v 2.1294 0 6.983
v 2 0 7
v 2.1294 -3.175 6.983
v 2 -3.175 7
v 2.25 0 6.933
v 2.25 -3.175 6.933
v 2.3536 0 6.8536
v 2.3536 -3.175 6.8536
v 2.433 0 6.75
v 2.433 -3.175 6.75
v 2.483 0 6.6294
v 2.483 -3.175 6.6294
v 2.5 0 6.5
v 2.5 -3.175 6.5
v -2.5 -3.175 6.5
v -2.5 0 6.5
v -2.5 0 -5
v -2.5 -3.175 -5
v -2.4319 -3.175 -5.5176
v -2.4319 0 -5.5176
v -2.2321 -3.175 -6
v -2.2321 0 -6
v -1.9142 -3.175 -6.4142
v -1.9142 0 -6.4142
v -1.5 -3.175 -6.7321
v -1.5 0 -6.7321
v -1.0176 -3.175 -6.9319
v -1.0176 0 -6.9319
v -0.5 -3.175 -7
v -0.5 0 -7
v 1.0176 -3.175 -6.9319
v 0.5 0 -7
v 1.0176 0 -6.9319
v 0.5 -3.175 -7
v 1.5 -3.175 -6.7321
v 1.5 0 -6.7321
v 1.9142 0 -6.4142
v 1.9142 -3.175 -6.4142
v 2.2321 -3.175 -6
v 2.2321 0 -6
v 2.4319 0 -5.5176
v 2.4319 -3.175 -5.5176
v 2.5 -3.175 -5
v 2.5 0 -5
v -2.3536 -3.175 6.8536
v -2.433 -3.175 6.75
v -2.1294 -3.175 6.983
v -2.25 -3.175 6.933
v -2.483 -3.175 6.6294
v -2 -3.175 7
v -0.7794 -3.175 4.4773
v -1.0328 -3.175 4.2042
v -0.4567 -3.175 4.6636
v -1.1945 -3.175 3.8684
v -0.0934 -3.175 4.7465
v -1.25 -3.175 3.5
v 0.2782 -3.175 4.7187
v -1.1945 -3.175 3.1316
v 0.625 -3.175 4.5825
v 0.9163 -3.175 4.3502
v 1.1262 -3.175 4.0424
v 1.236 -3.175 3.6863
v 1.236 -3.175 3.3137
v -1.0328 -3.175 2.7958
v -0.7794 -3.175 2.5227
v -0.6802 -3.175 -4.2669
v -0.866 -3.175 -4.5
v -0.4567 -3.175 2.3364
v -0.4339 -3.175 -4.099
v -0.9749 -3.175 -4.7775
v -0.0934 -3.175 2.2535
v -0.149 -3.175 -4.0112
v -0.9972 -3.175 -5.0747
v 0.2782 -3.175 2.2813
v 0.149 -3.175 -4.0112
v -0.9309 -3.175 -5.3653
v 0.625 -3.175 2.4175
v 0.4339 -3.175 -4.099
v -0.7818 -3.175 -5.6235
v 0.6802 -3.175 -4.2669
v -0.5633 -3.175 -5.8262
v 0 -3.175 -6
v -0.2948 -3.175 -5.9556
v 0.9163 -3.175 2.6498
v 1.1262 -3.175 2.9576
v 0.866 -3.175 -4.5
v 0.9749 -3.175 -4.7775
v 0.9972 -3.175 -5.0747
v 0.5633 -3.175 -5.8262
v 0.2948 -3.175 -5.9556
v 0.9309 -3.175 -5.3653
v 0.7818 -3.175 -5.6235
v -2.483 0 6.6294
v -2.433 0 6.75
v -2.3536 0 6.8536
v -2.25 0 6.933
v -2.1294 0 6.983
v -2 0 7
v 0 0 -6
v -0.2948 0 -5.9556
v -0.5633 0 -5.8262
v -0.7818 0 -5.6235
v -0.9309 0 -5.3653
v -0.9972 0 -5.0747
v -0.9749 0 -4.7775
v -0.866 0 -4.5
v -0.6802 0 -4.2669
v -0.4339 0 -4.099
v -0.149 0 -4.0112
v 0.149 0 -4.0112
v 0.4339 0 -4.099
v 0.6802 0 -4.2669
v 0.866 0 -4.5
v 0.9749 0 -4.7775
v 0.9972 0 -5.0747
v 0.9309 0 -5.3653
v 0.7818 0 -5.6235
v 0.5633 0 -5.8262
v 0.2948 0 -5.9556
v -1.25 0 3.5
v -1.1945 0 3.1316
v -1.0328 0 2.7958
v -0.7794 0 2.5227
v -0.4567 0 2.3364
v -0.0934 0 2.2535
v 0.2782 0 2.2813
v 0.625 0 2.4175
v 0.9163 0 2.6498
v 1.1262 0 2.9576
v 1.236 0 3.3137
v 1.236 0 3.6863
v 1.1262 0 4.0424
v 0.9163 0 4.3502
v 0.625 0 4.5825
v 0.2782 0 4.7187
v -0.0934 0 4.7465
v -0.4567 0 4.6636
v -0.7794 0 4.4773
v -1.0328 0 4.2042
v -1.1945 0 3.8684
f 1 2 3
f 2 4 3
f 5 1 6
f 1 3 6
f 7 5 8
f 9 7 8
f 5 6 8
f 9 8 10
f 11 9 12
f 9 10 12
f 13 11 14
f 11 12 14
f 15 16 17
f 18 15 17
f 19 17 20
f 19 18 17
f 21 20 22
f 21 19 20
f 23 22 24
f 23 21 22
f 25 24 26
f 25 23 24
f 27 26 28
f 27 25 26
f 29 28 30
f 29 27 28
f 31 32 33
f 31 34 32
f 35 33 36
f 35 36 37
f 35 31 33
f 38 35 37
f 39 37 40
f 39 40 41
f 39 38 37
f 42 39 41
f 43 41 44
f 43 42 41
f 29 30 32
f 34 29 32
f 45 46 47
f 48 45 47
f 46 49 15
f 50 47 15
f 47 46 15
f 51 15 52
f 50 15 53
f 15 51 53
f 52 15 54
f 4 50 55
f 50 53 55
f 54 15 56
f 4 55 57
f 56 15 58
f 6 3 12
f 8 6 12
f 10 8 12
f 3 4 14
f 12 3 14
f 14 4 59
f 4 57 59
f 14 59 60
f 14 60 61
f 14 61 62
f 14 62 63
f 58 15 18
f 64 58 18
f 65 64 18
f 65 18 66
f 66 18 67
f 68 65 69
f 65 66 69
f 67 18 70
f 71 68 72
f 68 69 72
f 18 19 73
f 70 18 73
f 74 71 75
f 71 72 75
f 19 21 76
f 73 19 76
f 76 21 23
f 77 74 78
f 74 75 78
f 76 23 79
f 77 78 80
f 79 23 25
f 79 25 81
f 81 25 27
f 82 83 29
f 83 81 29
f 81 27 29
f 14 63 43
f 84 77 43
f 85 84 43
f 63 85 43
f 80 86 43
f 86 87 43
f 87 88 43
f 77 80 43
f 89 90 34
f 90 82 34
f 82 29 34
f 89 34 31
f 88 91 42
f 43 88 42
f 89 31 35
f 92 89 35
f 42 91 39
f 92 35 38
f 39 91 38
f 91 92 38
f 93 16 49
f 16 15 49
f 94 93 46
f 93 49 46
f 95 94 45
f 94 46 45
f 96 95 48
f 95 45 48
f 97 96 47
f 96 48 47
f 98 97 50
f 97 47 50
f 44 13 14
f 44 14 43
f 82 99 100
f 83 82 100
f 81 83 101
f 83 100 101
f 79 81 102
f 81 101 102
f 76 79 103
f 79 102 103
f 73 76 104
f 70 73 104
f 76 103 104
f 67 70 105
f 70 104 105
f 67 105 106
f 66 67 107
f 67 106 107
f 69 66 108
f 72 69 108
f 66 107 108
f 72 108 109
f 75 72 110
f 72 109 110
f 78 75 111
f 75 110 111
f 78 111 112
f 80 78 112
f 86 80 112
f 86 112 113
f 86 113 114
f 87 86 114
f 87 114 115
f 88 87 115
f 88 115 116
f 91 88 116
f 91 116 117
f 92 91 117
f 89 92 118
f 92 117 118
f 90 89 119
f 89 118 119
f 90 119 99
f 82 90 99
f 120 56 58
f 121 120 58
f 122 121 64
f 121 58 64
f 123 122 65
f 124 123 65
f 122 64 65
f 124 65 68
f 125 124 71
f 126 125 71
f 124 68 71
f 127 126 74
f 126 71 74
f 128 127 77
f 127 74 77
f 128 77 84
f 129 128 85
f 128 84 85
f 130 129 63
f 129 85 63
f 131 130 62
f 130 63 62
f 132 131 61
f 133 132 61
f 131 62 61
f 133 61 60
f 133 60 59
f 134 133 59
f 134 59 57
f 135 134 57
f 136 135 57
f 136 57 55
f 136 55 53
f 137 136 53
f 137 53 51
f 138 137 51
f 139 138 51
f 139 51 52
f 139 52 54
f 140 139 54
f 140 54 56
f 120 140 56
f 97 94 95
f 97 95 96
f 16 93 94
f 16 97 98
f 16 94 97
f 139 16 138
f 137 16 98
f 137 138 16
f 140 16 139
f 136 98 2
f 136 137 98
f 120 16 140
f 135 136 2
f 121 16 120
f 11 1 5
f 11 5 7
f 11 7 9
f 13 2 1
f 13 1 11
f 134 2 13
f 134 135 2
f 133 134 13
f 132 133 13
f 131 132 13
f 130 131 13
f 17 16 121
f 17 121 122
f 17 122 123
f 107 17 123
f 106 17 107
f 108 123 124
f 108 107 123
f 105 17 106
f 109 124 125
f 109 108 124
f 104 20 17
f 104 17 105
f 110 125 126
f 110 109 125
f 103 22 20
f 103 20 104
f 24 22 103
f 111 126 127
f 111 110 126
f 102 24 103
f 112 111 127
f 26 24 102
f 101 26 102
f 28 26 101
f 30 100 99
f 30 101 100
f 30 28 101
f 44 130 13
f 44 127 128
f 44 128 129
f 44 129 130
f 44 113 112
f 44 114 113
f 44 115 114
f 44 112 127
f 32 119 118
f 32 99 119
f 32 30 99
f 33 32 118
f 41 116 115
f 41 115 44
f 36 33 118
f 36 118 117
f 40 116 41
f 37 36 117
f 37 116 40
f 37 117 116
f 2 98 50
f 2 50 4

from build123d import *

# Parameters (mm, degrees)
SKETCH2_W             = 5
SKETCH2_H             = 14
SKETCH2_R             = 1
BOSS_EXTRUDE1_DEPTH   = 3.175
M3X0_5_TAPPED_HOLE1_D = 2.5
FILLET1_R             = 2
FILLET2_R             = 0.5


with BuildPart() as part:
    # Sketch2 → Boss-Extrude1 (new body)
    with BuildSketch(Plane(origin=(0, 0, 0), x_dir=(1, 0, 0), z_dir=(0, 1, 0))):
        Rectangle(SKETCH2_W, SKETCH2_H)
        with Locations(Location((0, 5, 0), (0, 0, 90))):
            Circle(SKETCH2_R, mode=Mode.SUBTRACT)
    extrude(amount=-BOSS_EXTRUDE1_DEPTH)

    # M3x0.5 Tapped Hole1 (through all)
    with Locations(Plane(origin=(0, 0, 0), x_dir=(1, 0, 0), z_dir=(0, 1, 0))):
        with Locations((0, -3.5)):
            Hole(M3X0_5_TAPPED_HOLE1_D / 2)

    # Fillet1
    fillet1_edges = [part.edges().sort_by_distance(p)[0] for p in [
        (-2.5, -1.5875, -7),
        (2.5, -1.5875, -7),
    ]]
    fillet(fillet1_edges, radius=FILLET1_R)

    # Fillet2
    fillet2_edges = [part.edges().sort_by_distance(p)[0] for p in [
        (2.5, -1.5875, 7),
        (-2.5, -1.5875, 7),
    ]]
    fillet(fillet2_edges, radius=FILLET2_R)


solid = part.part
